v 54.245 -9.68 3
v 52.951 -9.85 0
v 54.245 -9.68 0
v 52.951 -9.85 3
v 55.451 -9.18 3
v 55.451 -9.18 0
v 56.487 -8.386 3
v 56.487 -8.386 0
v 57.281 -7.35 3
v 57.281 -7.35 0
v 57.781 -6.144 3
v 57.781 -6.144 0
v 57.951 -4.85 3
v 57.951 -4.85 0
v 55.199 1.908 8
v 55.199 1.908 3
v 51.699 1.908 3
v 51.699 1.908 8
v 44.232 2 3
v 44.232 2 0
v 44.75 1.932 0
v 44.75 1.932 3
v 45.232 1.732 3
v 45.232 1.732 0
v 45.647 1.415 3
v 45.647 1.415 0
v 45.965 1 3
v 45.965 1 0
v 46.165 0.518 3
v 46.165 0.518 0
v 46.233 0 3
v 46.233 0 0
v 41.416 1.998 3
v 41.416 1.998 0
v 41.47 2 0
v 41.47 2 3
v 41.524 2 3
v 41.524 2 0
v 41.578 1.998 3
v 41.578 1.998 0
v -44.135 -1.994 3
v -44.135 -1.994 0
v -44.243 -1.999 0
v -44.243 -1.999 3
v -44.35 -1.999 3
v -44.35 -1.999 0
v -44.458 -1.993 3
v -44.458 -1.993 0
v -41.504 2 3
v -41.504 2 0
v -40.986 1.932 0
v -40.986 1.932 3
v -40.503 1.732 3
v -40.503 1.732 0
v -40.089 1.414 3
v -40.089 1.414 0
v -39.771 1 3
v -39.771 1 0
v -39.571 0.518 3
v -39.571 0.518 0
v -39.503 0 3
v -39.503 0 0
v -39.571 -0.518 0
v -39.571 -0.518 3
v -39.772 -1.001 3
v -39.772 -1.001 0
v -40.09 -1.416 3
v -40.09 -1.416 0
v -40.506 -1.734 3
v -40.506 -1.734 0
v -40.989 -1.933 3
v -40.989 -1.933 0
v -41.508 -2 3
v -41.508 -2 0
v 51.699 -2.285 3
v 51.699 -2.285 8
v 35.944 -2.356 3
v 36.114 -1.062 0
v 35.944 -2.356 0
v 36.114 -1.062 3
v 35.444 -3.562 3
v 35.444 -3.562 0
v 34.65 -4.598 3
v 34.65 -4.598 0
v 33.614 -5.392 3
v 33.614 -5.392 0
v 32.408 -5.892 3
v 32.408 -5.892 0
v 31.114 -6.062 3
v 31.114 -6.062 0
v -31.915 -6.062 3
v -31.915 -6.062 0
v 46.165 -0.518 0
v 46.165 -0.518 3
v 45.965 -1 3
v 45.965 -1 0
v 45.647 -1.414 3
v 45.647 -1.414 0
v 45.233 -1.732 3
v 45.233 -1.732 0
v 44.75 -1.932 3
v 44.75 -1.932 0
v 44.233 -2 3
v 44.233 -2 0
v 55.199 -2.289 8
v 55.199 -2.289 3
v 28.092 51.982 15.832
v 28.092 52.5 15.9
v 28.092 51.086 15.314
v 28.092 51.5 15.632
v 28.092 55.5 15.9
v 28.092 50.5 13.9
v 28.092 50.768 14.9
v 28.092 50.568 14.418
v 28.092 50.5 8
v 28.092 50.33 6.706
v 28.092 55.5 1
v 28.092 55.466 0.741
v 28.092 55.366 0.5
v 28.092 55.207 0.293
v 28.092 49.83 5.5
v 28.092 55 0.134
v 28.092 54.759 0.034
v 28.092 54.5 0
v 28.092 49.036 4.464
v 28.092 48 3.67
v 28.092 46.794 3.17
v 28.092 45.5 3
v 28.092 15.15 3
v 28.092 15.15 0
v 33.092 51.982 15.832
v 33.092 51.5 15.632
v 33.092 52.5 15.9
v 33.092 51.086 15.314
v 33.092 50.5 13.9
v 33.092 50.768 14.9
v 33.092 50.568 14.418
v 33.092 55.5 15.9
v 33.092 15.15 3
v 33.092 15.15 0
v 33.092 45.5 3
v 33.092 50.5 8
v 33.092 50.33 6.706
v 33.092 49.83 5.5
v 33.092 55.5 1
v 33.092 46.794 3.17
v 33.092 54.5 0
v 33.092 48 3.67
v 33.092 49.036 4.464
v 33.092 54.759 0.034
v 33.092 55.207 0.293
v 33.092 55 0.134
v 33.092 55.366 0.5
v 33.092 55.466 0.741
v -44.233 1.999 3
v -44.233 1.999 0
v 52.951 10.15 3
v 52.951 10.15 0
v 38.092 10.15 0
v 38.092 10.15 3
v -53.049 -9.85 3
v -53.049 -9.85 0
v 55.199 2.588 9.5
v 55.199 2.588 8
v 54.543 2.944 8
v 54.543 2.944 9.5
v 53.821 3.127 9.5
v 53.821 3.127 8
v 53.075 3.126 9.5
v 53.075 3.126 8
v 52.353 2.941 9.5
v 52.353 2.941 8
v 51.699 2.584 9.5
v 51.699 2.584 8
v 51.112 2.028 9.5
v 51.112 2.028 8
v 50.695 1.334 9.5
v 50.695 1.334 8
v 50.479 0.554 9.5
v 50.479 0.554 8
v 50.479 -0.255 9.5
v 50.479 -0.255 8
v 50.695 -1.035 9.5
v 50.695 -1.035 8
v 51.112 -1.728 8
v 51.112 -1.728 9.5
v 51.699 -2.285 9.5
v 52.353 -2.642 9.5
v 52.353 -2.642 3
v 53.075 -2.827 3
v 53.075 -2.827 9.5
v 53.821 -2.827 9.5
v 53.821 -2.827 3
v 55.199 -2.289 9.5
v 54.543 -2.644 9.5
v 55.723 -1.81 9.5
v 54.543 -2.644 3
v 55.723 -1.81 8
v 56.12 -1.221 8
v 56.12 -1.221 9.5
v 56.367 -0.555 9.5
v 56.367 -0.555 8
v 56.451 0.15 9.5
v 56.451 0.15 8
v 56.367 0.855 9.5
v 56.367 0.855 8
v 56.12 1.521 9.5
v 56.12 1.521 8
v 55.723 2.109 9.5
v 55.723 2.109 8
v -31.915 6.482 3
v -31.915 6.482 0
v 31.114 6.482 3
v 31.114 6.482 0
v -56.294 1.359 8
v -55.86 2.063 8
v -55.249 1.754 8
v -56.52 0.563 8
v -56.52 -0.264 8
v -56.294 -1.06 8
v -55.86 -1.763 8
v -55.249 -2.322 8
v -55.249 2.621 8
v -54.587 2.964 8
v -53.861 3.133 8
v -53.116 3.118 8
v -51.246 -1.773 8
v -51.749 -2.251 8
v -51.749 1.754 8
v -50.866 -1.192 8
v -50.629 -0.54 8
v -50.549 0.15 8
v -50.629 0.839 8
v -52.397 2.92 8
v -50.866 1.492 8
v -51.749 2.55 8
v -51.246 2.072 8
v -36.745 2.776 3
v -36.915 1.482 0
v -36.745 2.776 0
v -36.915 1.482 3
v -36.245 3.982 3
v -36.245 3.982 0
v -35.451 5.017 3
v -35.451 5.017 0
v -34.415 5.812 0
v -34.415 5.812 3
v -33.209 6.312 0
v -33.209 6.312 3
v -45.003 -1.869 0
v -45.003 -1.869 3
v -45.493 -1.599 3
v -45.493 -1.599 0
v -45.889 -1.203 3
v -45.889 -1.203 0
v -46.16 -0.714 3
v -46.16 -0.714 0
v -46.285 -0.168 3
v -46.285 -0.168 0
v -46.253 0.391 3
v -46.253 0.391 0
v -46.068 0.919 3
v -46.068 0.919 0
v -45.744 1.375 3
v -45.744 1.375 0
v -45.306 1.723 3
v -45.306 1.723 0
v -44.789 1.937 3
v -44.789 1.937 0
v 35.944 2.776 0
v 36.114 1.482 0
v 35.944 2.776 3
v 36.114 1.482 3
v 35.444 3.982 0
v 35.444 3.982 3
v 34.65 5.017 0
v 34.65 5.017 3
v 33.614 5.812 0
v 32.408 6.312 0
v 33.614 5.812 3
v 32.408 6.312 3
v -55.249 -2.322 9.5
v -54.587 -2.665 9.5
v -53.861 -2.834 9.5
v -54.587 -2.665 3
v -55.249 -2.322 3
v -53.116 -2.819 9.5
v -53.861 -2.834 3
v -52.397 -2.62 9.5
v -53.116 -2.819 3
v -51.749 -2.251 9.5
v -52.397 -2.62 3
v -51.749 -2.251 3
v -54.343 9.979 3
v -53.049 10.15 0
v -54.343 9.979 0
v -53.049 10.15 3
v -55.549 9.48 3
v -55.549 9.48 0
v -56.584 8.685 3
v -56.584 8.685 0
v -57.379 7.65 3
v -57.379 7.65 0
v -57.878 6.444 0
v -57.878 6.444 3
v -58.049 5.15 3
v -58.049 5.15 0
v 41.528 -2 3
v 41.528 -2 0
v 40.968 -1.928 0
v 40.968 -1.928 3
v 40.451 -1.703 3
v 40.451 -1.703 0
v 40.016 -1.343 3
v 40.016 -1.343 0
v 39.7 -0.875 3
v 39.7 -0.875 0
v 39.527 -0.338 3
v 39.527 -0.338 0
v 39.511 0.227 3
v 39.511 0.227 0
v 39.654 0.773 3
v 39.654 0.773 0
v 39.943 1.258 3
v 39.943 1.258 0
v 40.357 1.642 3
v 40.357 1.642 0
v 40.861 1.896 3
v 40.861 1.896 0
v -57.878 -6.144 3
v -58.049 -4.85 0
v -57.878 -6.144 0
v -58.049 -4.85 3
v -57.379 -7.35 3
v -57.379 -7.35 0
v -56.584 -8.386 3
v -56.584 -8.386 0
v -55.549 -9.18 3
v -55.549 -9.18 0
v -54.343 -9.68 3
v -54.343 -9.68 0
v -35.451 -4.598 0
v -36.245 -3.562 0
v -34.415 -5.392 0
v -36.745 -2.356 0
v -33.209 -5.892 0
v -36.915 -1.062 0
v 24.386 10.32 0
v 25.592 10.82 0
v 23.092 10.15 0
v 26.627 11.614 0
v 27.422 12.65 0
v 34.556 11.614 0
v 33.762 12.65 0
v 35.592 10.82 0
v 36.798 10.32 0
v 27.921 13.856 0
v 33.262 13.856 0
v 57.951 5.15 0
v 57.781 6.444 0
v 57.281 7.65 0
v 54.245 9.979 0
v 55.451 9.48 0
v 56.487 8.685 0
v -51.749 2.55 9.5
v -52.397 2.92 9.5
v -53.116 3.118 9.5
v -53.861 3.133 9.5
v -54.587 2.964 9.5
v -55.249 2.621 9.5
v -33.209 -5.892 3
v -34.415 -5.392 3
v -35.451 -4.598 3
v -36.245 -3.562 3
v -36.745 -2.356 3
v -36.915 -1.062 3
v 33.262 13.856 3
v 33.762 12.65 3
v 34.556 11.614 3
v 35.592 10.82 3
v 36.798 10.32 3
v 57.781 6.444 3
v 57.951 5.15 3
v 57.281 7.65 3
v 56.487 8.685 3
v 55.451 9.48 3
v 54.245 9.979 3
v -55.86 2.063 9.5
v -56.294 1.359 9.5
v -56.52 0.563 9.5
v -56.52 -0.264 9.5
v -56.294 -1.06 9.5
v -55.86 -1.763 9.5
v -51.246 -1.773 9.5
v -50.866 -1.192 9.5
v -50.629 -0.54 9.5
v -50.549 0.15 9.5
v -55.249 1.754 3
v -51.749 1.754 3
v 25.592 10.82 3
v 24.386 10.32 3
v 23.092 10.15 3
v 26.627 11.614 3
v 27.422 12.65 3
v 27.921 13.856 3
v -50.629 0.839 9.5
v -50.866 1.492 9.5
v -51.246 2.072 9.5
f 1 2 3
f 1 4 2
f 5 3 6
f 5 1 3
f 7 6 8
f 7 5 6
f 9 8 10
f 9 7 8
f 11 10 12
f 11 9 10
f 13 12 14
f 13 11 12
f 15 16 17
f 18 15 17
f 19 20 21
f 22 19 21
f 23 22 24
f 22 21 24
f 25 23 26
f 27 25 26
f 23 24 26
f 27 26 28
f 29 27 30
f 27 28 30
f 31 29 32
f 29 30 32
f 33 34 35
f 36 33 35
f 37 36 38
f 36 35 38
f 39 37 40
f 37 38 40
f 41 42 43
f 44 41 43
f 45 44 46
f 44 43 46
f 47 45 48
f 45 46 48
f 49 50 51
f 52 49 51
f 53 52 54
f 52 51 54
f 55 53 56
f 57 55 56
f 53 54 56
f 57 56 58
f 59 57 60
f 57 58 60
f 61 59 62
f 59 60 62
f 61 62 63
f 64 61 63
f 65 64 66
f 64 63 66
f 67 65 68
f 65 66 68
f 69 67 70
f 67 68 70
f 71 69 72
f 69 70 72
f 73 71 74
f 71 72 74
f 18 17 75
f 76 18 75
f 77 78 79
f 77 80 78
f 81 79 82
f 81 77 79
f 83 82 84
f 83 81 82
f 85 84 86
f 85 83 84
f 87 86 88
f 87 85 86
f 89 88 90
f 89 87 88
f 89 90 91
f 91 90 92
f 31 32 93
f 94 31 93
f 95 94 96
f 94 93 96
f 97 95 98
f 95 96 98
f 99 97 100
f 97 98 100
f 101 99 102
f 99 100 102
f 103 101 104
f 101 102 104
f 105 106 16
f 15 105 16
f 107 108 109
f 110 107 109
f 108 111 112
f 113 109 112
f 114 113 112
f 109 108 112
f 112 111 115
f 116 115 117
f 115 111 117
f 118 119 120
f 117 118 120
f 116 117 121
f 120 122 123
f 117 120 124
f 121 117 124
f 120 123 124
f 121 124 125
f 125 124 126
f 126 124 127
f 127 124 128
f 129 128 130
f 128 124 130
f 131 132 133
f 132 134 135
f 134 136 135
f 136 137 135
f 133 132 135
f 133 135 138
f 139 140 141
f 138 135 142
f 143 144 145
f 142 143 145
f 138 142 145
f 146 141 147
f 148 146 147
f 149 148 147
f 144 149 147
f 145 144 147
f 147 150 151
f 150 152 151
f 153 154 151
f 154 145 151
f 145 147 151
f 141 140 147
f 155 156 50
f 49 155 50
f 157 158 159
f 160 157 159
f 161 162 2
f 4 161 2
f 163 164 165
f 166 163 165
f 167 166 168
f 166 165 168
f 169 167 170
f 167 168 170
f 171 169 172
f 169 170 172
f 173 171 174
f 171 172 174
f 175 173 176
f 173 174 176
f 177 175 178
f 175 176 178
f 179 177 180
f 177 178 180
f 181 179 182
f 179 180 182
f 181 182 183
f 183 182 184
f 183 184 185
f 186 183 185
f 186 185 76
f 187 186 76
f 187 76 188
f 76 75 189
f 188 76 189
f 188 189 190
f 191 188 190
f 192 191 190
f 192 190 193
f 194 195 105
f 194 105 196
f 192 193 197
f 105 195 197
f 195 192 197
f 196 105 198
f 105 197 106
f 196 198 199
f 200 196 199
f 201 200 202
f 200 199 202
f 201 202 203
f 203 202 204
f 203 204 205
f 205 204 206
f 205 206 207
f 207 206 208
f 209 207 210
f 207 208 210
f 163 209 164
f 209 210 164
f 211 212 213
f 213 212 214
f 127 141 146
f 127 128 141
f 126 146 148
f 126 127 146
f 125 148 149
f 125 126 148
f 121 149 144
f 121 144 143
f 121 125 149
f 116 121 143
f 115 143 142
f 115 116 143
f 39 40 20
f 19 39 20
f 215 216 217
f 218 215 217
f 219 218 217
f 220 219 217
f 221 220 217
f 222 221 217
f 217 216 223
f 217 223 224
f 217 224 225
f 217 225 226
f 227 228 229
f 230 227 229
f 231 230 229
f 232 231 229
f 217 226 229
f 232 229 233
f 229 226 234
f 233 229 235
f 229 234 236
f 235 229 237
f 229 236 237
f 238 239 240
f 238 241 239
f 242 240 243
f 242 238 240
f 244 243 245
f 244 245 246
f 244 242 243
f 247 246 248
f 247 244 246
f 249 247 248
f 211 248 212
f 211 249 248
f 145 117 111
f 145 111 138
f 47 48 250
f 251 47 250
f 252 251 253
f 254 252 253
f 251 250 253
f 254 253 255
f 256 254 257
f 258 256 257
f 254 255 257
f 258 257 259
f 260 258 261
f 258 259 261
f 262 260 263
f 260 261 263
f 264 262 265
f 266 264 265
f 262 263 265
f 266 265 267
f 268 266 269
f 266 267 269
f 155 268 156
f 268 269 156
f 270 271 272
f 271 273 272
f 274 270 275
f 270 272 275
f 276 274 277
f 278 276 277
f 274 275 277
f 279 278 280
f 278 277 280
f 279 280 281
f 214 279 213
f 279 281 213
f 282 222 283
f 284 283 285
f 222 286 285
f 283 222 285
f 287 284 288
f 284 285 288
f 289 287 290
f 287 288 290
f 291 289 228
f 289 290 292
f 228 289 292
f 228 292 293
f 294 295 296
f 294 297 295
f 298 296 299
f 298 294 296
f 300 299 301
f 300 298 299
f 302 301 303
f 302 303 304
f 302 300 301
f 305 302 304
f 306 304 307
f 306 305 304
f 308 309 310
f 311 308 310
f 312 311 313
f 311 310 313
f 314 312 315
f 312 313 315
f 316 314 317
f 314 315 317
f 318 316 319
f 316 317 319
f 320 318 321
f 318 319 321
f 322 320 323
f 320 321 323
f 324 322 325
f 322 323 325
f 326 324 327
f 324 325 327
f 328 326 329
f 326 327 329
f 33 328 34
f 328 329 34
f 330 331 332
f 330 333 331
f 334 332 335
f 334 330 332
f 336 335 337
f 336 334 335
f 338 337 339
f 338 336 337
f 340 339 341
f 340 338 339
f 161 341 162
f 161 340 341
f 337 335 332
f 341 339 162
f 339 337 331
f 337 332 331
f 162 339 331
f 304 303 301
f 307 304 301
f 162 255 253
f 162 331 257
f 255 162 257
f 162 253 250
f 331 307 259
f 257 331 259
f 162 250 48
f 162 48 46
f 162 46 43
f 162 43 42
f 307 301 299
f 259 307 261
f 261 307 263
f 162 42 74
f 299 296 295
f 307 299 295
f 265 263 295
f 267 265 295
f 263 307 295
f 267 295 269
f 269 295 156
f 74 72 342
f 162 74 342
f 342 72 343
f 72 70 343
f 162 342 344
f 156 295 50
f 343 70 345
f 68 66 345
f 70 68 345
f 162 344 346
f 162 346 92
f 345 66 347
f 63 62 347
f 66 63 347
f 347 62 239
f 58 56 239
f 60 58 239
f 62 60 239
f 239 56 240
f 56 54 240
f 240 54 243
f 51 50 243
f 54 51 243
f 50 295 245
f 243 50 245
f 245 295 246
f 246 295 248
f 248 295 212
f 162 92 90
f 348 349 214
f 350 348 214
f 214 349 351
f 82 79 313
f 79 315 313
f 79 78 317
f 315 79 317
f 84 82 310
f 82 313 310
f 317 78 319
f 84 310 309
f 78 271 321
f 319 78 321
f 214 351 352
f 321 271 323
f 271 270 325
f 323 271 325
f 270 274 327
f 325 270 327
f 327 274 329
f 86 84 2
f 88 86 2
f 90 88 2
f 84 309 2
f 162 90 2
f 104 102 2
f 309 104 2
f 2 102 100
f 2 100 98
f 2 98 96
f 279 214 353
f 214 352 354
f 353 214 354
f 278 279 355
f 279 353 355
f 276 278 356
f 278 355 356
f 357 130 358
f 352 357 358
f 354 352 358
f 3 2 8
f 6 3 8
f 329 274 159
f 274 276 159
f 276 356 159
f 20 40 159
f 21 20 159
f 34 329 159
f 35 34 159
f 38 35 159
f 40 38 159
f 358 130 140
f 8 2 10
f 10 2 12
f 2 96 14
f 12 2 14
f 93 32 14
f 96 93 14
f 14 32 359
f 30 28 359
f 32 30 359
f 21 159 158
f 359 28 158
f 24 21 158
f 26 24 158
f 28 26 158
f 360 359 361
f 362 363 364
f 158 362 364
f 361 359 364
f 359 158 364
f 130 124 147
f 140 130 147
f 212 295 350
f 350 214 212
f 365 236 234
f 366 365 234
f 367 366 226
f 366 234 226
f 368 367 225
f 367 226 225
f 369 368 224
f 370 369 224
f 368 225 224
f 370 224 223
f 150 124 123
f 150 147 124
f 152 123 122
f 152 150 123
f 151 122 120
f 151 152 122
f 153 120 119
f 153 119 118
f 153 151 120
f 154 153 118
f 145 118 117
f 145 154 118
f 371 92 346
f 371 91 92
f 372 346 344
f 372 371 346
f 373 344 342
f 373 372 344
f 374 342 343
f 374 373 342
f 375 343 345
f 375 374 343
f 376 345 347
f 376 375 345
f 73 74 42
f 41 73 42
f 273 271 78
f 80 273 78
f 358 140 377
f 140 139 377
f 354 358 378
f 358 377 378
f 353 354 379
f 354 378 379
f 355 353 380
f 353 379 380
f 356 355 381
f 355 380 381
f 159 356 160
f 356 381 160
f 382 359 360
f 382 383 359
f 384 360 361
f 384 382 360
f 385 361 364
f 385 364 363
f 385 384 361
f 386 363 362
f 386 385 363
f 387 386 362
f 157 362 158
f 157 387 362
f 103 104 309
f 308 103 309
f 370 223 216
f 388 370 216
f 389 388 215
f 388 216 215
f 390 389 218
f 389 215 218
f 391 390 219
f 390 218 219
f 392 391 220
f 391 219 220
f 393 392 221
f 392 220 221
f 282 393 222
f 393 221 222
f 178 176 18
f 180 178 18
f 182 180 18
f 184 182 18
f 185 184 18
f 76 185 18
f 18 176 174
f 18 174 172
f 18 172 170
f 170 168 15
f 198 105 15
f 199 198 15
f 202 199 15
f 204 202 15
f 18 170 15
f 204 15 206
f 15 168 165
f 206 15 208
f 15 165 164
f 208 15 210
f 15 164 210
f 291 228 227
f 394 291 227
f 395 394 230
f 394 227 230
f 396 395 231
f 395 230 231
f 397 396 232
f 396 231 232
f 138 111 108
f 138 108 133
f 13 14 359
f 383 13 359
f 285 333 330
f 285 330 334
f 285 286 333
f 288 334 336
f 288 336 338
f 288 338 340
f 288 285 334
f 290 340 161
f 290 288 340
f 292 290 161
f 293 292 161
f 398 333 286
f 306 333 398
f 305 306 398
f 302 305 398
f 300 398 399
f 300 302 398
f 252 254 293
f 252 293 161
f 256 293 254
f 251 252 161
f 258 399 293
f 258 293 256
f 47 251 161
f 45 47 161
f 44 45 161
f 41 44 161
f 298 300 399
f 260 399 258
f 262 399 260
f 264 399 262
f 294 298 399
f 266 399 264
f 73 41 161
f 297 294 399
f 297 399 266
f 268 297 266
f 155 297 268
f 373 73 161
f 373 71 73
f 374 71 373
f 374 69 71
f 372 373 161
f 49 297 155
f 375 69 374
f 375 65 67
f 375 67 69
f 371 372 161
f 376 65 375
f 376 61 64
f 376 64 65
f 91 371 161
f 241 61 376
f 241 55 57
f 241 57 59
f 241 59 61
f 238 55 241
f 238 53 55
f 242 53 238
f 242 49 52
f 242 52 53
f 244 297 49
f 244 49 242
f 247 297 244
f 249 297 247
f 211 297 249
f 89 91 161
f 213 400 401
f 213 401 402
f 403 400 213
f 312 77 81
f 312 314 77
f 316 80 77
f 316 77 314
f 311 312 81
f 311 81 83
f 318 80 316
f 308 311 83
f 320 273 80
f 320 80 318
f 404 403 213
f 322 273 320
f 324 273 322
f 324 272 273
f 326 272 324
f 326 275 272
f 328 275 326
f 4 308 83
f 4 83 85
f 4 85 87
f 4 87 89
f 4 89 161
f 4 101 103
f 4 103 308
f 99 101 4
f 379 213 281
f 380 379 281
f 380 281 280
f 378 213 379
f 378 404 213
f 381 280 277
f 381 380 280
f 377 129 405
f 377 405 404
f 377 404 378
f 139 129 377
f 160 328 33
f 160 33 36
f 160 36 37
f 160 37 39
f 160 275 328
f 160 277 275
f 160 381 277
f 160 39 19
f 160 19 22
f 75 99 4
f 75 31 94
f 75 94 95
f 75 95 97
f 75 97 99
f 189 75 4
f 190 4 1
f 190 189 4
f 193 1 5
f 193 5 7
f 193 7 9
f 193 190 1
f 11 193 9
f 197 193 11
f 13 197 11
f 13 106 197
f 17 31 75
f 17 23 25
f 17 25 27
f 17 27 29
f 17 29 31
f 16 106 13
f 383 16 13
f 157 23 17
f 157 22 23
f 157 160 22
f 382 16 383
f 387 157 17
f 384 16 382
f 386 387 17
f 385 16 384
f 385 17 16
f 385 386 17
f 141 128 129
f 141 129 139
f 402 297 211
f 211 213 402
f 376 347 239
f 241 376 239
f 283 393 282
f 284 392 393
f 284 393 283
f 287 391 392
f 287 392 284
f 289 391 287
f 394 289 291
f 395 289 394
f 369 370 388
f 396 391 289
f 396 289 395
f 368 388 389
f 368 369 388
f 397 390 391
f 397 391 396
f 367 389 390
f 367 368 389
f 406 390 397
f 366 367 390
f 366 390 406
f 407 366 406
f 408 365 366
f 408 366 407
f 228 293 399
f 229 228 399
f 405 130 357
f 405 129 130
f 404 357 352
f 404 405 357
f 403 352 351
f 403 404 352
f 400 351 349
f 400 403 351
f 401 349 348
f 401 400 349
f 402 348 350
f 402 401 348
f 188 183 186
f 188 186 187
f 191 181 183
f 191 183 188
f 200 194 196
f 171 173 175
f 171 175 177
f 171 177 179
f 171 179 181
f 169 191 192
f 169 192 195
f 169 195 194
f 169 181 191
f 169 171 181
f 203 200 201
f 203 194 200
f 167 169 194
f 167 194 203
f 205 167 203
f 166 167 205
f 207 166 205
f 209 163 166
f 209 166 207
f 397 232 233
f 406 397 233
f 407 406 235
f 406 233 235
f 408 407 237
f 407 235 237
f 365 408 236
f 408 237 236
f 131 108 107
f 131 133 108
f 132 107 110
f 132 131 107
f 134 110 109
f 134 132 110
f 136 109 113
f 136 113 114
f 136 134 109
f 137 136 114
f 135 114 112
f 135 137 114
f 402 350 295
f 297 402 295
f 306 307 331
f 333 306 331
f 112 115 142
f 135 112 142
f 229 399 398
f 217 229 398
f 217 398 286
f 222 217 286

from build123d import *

# Parameters (mm, degrees)
F0_W     = 5
F0_H     = 40.3502766341
F0_H_2   = 5
F0_H_3   = 3.6678295396
F1_DEPTH = 3
F2_DEPTH = 8
F3_START = 8
F3_DEPTH = 1.5
F4_DEPTH = 15.9
F5_R     = 5
F6_R     = 2
F7_R     = 5
F8_R     = 5
F9_R     = 1


# Not quite as in the source:
# - a feature names something its author has since deleted; it is built from what else it names


with BuildPart() as f1:
    # F0 (on Top) → F1 (new body)
    with BuildSketch(Plane.XY):
        Polygon((28.0917086639, 10.1497233659), (-58.0486447513, 10.1497233659), (-58.0486447513, -9.8502766341), (57.9513552487, -9.8502766341), (57.9513552487, 10.1497233659), (33.0917086639, 10.1497233659), (33.0917086639, 6.4818938263), (36.1140687019, 6.4818938263), (36.1140687019, -6.0621835291), (-36.915011704, -6.0621835291), (-36.915011704, 6.4818938263), (28.0917086639, 6.4818938263), align=None)
        with BuildLine():
            ThreePointArc((-51.749339269, 2.5502440972), (-50.8655573089, 1.4917523434), (-50.5486447513, 0.1497233659))
            ThreePointArc((-50.5486447513, 0.1497233659), (-50.8655573089, -1.1923056116), (-51.749339269, -2.2507973654))
            ThreePointArc((-51.749339269, -2.2507973654), (-53.4879347075, -2.8496622863), (-55.249339269, -2.3216402572))
            ThreePointArc((-55.249339269, -2.3216402572), (-56.5486447513, 0.1497233659), (-55.249339269, 2.621086989))
            ThreePointArc((-55.249339269, 2.621086989), (-53.4879347075, 3.1491090181), (-51.749339269, 2.5502440972))
        make_face(mode=Mode.SUBTRACT)
        with BuildLine():
            ThreePointArc((-44.4575695538, -1.9931100518), (-46.2885460051, 0.1122973538), (-44.233055807, 1.9991399955))
            Line((-44.233055807, 1.9991399955), (-41.5036168453, 1.9999999007))
            ThreePointArc((-41.5036168453, 1.9999999007), (-40.0889959767, 1.4144363176), (-39.5029867487, 0))
            ThreePointArc((-39.5029867487, 0), (-40.090424389, -1.4158628395), (-41.5076543288, -1.9999945534))
            Line((-41.5076543288, -1.9999945534), (-44.1351375643, -1.9938625424))
            ThreePointArc((-44.1351375643, -1.9938625424), (-44.296368748, -1.9999945534), (-44.4575695538, -1.9931100518))
        make_face(mode=Mode.SUBTRACT)
        with BuildLine():
            ThreePointArc((44.2317598479, 1.9999996372), (45.6467520995, 1.4146394126), (46.2329645157, 0))
            ThreePointArc((46.2329645157, 0), (45.6471198627, -1.4142717753), (44.2327998612, -1.9999999932))
            Line((44.2327998612, -1.9999999932), (41.528318721, -1.9997773407))
            ThreePointArc((41.528318721, -1.9997773407), (39.4992630702, -0.0561038438), (41.4161207108, 1.998303682))
            ThreePointArc((41.4161207108, 1.998303682), (41.4972713372, 1.9999996372), (41.5784239479, 1.9984014428))
            Line((41.5784239479, 1.9984014428), (44.2317598479, 1.9999996372))
        make_face(mode=Mode.SUBTRACT)
        with BuildLine():
            ThreePointArc((55.1986493307, 2.5883630259), (56.1198644061, 1.5205110508), (56.4513552487, 0.1497233659))
            ThreePointArc((56.4513552487, 0.1497233659), (56.1198644061, -1.221064319), (55.1986493307, -2.288916294))
            ThreePointArc((55.1986493307, -2.288916294), (53.4480237917, -2.8502747843), (51.6986493307, -2.2850295918))
            ThreePointArc((51.6986493307, -2.2850295918), (50.4513552487, 0.1497233659), (51.6986493307, 2.5844763236))
            ThreePointArc((51.6986493307, 2.5844763236), (53.4480237917, 3.1497215161), (55.1986493307, 2.5883630259))
        make_face(mode=Mode.SUBTRACT)
        with BuildLine():
            Line((-51.749339269, 1.7544291914), (-51.749339269, 2.5502440972))
            ThreePointArc((-51.749339269, 2.5502440972), (-53.4879347075, 3.1491090181), (-55.249339269, 2.621086989))
            Line((-55.249339269, 2.621086989), (-55.249339269, 1.7544291914))
            Line((-55.249339269, 1.7544291914), (-51.749339269, 1.7544291914))
        make_face()
        with BuildLine():
            Line((-55.249339269, 1.7544291914), (-55.249339269, 2.621086989))
            ThreePointArc((-55.249339269, 2.621086989), (-56.5486447513, 0.1497233659), (-55.249339269, -2.3216402572))
            Line((-55.249339269, -2.3216402572), (-55.249339269, 1.7544291914))
        make_face()
        with BuildLine():
            ThreePointArc((-55.249339269, -2.3216402572), (-53.4879347075, -2.8496622863), (-51.749339269, -2.2507973654))
            Line((-51.749339269, -2.2507973654), (-51.749339269, 1.7544291914))
            Line((-51.749339269, 1.7544291914), (-55.249339269, 1.7544291914))
            Line((-55.249339269, 1.7544291914), (-55.249339269, -2.3216402572))
        make_face()
        with BuildLine():
            ThreePointArc((-51.749339269, -2.2507973654), (-50.8655573089, -1.1923056116), (-50.5486447513, 0.1497233659))
            ThreePointArc((-50.5486447513, 0.1497233659), (-50.8655573089, 1.4917523434), (-51.749339269, 2.5502440972))
            Line((-51.749339269, 2.5502440972), (-51.749339269, 1.7544291914))
            Line((-51.749339269, 1.7544291914), (-51.749339269, -2.2507973654))
        make_face()
        with BuildLine():
            Line((55.1986493307, 1.9077386241), (55.1986493307, 2.5883630259))
            ThreePointArc((55.1986493307, 2.5883630259), (53.4480237917, 3.1497215161), (51.6986493307, 2.5844763236))
            Line((51.6986493307, 2.5844763236), (51.6986493307, 1.9077386241))
            Line((51.6986493307, 1.9077386241), (55.1986493307, 1.9077386241))
        make_face()
        with BuildLine():
            Line((51.6986493307, 1.9077386241), (51.6986493307, 2.5844763236))
            ThreePointArc((51.6986493307, 2.5844763236), (50.4513552487, 0.1497233659), (51.6986493307, -2.2850295918))
            Line((51.6986493307, -2.2850295918), (51.6986493307, 1.9077386241))
        make_face()
        with BuildLine():
            ThreePointArc((51.6986493307, -2.2850295918), (53.4480237917, -2.8502747843), (55.1986493307, -2.288916294))
            Line((55.1986493307, -2.288916294), (55.1986493307, 1.9077386241))
            Line((55.1986493307, 1.9077386241), (51.6986493307, 1.9077386241))
            Line((51.6986493307, 1.9077386241), (51.6986493307, -2.2850295918))
        make_face()
        with BuildLine():
            ThreePointArc((55.1986493307, -2.288916294), (56.1198644061, -1.221064319), (56.4513552487, 0.1497233659))
            ThreePointArc((56.4513552487, 0.1497233659), (56.1198644061, 1.5205110508), (55.1986493307, 2.5883630259))
            Line((55.1986493307, 2.5883630259), (55.1986493307, 1.9077386241))
            Line((55.1986493307, 1.9077386241), (55.1986493307, -2.288916294))
        make_face()
        with Locations((30.5917086639, 30.324861683)):
            Rectangle(F0_W, F0_H)
        with Locations((30.5917086639, 53)):
            Rectangle(F0_W, F0_H_2)
        with Locations((30.5917086639, 8.3158085961)):
            Rectangle(F0_W, F0_H_3)
    extrude(amount=F1_DEPTH)

    # F0 (on Top) → F2 (join)
    with BuildSketch(Plane.XY):
        with BuildLine():
            ThreePointArc((51.6986493307, -2.2850295918), (53.4480237917, -2.8502747843), (55.1986493307, -2.288916294))
            Line((55.1986493307, -2.288916294), (55.1986493307, 1.9077386241))
            Line((55.1986493307, 1.9077386241), (51.6986493307, 1.9077386241))
            Line((51.6986493307, 1.9077386241), (51.6986493307, -2.2850295918))
        make_face()
        with BuildLine():
            ThreePointArc((-55.249339269, -2.3216402572), (-53.4879347075, -2.8496622863), (-51.749339269, -2.2507973654))
            Line((-51.749339269, -2.2507973654), (-51.749339269, 1.7544291914))
            Line((-51.749339269, 1.7544291914), (-55.249339269, 1.7544291914))
            Line((-55.249339269, 1.7544291914), (-55.249339269, -2.3216402572))
        make_face()
    extrude(amount=F2_DEPTH)

    # F0 (on Top) → F3 (join)
    with BuildSketch(Plane.XY.offset(F3_START)):
        with BuildLine():
            Line((-55.249339269, 1.7544291914), (-55.249339269, 2.621086989))
            ThreePointArc((-55.249339269, 2.621086989), (-56.5486447513, 0.1497233659), (-55.249339269, -2.3216402572))
            Line((-55.249339269, -2.3216402572), (-55.249339269, 1.7544291914))
        make_face()
        with BuildLine():
            Line((-51.749339269, 1.7544291914), (-51.749339269, 2.5502440972))
            ThreePointArc((-51.749339269, 2.5502440972), (-53.4879347075, 3.1491090181), (-55.249339269, 2.621086989))
            Line((-55.249339269, 2.621086989), (-55.249339269, 1.7544291914))
            Line((-55.249339269, 1.7544291914), (-51.749339269, 1.7544291914))
        make_face()
        with BuildLine():
            ThreePointArc((-55.249339269, -2.3216402572), (-53.4879347075, -2.8496622863), (-51.749339269, -2.2507973654))
            Line((-51.749339269, -2.2507973654), (-51.749339269, 1.7544291914))
            Line((-51.749339269, 1.7544291914), (-55.249339269, 1.7544291914))
            Line((-55.249339269, 1.7544291914), (-55.249339269, -2.3216402572))
        make_face()
        with BuildLine():
            ThreePointArc((-51.749339269, -2.2507973654), (-50.8655573089, -1.1923056116), (-50.5486447513, 0.1497233659))
            ThreePointArc((-50.5486447513, 0.1497233659), (-50.8655573089, 1.4917523434), (-51.749339269, 2.5502440972))
            Line((-51.749339269, 2.5502440972), (-51.749339269, 1.7544291914))
            Line((-51.749339269, 1.7544291914), (-51.749339269, -2.2507973654))
        make_face()
        with BuildLine():
            Line((51.6986493307, 1.9077386241), (51.6986493307, 2.5844763236))
            ThreePointArc((51.6986493307, 2.5844763236), (50.4513552487, 0.1497233659), (51.6986493307, -2.2850295918))
            Line((51.6986493307, -2.2850295918), (51.6986493307, 1.9077386241))
        make_face()
        with BuildLine():
            Line((55.1986493307, 1.9077386241), (55.1986493307, 2.5883630259))
            ThreePointArc((55.1986493307, 2.5883630259), (53.4480237917, 3.1497215161), (51.6986493307, 2.5844763236))
            Line((51.6986493307, 2.5844763236), (51.6986493307, 1.9077386241))
            Line((51.6986493307, 1.9077386241), (55.1986493307, 1.9077386241))
        make_face()
        with BuildLine():
            ThreePointArc((51.6986493307, -2.2850295918), (53.4480237917, -2.8502747843), (55.1986493307, -2.288916294))
            Line((55.1986493307, -2.288916294), (55.1986493307, 1.9077386241))
            Line((55.1986493307, 1.9077386241), (51.6986493307, 1.9077386241))
            Line((51.6986493307, 1.9077386241), (51.6986493307, -2.2850295918))
        make_face()
        with BuildLine():
            ThreePointArc((55.1986493307, -2.288916294), (56.1198644061, -1.221064319), (56.4513552487, 0.1497233659))
            ThreePointArc((56.4513552487, 0.1497233659), (56.1198644061, 1.5205110508), (55.1986493307, 2.5883630259))
            Line((55.1986493307, 2.5883630259), (55.1986493307, 1.9077386241))
            Line((55.1986493307, 1.9077386241), (55.1986493307, -2.288916294))
        make_face()
    extrude(amount=F3_DEPTH)

    # F0 (on Top) → F4 (join)
    with BuildSketch(Plane.XY):
        with Locations((30.5917086639, 53)):
            Rectangle(F0_W, F0_H_2)
    extrude(amount=F4_DEPTH)

    # F5
    f5_edges = [f1.edges().sort_by_distance(p)[0] for p in [
        (-58.048645, -9.850277, 1.5),
        (57.951355, -9.850277, 1.5),
        (57.951355, 10.149723, 1.5),
        (-58.048645, 10.149723, 1.5),
    ]]
    fillet(f5_edges, radius=F5_R)

    # F6
    f6_edges = [f1.edges().sort_by_distance(p)[0] for p in [
        (30.591709, 50.5, 15.9),
    ]]
    fillet(f6_edges, radius=F6_R)

    # F7
    f7_edges = [f1.edges().sort_by_distance(p)[0] for p in [
        (-36.915012, 6.481894, 1.5),
        (-36.915012, -6.062184, 1.5),
        (36.114069, -6.062184, 1.5),
        (36.114069, 6.481894, 1.5),
        (28.091709, 10.149723, 1.5),
        (33.091709, 10.149723, 1.5),
    ]]
    fillet(f7_edges, radius=F7_R)

    # F8
    f8_edges = [f1.edges().sort_by_distance(p)[0] for p in [
        (30.591709, 50.5, 3),
    ]]
    fillet(f8_edges, radius=F8_R)

    # F9
    f9_edges = [f1.edges().sort_by_distance(p)[0] for p in [
        (30.591709, 55.5, 0),
    ]]
    fillet(f9_edges, radius=F9_R)


solid = f1.part
